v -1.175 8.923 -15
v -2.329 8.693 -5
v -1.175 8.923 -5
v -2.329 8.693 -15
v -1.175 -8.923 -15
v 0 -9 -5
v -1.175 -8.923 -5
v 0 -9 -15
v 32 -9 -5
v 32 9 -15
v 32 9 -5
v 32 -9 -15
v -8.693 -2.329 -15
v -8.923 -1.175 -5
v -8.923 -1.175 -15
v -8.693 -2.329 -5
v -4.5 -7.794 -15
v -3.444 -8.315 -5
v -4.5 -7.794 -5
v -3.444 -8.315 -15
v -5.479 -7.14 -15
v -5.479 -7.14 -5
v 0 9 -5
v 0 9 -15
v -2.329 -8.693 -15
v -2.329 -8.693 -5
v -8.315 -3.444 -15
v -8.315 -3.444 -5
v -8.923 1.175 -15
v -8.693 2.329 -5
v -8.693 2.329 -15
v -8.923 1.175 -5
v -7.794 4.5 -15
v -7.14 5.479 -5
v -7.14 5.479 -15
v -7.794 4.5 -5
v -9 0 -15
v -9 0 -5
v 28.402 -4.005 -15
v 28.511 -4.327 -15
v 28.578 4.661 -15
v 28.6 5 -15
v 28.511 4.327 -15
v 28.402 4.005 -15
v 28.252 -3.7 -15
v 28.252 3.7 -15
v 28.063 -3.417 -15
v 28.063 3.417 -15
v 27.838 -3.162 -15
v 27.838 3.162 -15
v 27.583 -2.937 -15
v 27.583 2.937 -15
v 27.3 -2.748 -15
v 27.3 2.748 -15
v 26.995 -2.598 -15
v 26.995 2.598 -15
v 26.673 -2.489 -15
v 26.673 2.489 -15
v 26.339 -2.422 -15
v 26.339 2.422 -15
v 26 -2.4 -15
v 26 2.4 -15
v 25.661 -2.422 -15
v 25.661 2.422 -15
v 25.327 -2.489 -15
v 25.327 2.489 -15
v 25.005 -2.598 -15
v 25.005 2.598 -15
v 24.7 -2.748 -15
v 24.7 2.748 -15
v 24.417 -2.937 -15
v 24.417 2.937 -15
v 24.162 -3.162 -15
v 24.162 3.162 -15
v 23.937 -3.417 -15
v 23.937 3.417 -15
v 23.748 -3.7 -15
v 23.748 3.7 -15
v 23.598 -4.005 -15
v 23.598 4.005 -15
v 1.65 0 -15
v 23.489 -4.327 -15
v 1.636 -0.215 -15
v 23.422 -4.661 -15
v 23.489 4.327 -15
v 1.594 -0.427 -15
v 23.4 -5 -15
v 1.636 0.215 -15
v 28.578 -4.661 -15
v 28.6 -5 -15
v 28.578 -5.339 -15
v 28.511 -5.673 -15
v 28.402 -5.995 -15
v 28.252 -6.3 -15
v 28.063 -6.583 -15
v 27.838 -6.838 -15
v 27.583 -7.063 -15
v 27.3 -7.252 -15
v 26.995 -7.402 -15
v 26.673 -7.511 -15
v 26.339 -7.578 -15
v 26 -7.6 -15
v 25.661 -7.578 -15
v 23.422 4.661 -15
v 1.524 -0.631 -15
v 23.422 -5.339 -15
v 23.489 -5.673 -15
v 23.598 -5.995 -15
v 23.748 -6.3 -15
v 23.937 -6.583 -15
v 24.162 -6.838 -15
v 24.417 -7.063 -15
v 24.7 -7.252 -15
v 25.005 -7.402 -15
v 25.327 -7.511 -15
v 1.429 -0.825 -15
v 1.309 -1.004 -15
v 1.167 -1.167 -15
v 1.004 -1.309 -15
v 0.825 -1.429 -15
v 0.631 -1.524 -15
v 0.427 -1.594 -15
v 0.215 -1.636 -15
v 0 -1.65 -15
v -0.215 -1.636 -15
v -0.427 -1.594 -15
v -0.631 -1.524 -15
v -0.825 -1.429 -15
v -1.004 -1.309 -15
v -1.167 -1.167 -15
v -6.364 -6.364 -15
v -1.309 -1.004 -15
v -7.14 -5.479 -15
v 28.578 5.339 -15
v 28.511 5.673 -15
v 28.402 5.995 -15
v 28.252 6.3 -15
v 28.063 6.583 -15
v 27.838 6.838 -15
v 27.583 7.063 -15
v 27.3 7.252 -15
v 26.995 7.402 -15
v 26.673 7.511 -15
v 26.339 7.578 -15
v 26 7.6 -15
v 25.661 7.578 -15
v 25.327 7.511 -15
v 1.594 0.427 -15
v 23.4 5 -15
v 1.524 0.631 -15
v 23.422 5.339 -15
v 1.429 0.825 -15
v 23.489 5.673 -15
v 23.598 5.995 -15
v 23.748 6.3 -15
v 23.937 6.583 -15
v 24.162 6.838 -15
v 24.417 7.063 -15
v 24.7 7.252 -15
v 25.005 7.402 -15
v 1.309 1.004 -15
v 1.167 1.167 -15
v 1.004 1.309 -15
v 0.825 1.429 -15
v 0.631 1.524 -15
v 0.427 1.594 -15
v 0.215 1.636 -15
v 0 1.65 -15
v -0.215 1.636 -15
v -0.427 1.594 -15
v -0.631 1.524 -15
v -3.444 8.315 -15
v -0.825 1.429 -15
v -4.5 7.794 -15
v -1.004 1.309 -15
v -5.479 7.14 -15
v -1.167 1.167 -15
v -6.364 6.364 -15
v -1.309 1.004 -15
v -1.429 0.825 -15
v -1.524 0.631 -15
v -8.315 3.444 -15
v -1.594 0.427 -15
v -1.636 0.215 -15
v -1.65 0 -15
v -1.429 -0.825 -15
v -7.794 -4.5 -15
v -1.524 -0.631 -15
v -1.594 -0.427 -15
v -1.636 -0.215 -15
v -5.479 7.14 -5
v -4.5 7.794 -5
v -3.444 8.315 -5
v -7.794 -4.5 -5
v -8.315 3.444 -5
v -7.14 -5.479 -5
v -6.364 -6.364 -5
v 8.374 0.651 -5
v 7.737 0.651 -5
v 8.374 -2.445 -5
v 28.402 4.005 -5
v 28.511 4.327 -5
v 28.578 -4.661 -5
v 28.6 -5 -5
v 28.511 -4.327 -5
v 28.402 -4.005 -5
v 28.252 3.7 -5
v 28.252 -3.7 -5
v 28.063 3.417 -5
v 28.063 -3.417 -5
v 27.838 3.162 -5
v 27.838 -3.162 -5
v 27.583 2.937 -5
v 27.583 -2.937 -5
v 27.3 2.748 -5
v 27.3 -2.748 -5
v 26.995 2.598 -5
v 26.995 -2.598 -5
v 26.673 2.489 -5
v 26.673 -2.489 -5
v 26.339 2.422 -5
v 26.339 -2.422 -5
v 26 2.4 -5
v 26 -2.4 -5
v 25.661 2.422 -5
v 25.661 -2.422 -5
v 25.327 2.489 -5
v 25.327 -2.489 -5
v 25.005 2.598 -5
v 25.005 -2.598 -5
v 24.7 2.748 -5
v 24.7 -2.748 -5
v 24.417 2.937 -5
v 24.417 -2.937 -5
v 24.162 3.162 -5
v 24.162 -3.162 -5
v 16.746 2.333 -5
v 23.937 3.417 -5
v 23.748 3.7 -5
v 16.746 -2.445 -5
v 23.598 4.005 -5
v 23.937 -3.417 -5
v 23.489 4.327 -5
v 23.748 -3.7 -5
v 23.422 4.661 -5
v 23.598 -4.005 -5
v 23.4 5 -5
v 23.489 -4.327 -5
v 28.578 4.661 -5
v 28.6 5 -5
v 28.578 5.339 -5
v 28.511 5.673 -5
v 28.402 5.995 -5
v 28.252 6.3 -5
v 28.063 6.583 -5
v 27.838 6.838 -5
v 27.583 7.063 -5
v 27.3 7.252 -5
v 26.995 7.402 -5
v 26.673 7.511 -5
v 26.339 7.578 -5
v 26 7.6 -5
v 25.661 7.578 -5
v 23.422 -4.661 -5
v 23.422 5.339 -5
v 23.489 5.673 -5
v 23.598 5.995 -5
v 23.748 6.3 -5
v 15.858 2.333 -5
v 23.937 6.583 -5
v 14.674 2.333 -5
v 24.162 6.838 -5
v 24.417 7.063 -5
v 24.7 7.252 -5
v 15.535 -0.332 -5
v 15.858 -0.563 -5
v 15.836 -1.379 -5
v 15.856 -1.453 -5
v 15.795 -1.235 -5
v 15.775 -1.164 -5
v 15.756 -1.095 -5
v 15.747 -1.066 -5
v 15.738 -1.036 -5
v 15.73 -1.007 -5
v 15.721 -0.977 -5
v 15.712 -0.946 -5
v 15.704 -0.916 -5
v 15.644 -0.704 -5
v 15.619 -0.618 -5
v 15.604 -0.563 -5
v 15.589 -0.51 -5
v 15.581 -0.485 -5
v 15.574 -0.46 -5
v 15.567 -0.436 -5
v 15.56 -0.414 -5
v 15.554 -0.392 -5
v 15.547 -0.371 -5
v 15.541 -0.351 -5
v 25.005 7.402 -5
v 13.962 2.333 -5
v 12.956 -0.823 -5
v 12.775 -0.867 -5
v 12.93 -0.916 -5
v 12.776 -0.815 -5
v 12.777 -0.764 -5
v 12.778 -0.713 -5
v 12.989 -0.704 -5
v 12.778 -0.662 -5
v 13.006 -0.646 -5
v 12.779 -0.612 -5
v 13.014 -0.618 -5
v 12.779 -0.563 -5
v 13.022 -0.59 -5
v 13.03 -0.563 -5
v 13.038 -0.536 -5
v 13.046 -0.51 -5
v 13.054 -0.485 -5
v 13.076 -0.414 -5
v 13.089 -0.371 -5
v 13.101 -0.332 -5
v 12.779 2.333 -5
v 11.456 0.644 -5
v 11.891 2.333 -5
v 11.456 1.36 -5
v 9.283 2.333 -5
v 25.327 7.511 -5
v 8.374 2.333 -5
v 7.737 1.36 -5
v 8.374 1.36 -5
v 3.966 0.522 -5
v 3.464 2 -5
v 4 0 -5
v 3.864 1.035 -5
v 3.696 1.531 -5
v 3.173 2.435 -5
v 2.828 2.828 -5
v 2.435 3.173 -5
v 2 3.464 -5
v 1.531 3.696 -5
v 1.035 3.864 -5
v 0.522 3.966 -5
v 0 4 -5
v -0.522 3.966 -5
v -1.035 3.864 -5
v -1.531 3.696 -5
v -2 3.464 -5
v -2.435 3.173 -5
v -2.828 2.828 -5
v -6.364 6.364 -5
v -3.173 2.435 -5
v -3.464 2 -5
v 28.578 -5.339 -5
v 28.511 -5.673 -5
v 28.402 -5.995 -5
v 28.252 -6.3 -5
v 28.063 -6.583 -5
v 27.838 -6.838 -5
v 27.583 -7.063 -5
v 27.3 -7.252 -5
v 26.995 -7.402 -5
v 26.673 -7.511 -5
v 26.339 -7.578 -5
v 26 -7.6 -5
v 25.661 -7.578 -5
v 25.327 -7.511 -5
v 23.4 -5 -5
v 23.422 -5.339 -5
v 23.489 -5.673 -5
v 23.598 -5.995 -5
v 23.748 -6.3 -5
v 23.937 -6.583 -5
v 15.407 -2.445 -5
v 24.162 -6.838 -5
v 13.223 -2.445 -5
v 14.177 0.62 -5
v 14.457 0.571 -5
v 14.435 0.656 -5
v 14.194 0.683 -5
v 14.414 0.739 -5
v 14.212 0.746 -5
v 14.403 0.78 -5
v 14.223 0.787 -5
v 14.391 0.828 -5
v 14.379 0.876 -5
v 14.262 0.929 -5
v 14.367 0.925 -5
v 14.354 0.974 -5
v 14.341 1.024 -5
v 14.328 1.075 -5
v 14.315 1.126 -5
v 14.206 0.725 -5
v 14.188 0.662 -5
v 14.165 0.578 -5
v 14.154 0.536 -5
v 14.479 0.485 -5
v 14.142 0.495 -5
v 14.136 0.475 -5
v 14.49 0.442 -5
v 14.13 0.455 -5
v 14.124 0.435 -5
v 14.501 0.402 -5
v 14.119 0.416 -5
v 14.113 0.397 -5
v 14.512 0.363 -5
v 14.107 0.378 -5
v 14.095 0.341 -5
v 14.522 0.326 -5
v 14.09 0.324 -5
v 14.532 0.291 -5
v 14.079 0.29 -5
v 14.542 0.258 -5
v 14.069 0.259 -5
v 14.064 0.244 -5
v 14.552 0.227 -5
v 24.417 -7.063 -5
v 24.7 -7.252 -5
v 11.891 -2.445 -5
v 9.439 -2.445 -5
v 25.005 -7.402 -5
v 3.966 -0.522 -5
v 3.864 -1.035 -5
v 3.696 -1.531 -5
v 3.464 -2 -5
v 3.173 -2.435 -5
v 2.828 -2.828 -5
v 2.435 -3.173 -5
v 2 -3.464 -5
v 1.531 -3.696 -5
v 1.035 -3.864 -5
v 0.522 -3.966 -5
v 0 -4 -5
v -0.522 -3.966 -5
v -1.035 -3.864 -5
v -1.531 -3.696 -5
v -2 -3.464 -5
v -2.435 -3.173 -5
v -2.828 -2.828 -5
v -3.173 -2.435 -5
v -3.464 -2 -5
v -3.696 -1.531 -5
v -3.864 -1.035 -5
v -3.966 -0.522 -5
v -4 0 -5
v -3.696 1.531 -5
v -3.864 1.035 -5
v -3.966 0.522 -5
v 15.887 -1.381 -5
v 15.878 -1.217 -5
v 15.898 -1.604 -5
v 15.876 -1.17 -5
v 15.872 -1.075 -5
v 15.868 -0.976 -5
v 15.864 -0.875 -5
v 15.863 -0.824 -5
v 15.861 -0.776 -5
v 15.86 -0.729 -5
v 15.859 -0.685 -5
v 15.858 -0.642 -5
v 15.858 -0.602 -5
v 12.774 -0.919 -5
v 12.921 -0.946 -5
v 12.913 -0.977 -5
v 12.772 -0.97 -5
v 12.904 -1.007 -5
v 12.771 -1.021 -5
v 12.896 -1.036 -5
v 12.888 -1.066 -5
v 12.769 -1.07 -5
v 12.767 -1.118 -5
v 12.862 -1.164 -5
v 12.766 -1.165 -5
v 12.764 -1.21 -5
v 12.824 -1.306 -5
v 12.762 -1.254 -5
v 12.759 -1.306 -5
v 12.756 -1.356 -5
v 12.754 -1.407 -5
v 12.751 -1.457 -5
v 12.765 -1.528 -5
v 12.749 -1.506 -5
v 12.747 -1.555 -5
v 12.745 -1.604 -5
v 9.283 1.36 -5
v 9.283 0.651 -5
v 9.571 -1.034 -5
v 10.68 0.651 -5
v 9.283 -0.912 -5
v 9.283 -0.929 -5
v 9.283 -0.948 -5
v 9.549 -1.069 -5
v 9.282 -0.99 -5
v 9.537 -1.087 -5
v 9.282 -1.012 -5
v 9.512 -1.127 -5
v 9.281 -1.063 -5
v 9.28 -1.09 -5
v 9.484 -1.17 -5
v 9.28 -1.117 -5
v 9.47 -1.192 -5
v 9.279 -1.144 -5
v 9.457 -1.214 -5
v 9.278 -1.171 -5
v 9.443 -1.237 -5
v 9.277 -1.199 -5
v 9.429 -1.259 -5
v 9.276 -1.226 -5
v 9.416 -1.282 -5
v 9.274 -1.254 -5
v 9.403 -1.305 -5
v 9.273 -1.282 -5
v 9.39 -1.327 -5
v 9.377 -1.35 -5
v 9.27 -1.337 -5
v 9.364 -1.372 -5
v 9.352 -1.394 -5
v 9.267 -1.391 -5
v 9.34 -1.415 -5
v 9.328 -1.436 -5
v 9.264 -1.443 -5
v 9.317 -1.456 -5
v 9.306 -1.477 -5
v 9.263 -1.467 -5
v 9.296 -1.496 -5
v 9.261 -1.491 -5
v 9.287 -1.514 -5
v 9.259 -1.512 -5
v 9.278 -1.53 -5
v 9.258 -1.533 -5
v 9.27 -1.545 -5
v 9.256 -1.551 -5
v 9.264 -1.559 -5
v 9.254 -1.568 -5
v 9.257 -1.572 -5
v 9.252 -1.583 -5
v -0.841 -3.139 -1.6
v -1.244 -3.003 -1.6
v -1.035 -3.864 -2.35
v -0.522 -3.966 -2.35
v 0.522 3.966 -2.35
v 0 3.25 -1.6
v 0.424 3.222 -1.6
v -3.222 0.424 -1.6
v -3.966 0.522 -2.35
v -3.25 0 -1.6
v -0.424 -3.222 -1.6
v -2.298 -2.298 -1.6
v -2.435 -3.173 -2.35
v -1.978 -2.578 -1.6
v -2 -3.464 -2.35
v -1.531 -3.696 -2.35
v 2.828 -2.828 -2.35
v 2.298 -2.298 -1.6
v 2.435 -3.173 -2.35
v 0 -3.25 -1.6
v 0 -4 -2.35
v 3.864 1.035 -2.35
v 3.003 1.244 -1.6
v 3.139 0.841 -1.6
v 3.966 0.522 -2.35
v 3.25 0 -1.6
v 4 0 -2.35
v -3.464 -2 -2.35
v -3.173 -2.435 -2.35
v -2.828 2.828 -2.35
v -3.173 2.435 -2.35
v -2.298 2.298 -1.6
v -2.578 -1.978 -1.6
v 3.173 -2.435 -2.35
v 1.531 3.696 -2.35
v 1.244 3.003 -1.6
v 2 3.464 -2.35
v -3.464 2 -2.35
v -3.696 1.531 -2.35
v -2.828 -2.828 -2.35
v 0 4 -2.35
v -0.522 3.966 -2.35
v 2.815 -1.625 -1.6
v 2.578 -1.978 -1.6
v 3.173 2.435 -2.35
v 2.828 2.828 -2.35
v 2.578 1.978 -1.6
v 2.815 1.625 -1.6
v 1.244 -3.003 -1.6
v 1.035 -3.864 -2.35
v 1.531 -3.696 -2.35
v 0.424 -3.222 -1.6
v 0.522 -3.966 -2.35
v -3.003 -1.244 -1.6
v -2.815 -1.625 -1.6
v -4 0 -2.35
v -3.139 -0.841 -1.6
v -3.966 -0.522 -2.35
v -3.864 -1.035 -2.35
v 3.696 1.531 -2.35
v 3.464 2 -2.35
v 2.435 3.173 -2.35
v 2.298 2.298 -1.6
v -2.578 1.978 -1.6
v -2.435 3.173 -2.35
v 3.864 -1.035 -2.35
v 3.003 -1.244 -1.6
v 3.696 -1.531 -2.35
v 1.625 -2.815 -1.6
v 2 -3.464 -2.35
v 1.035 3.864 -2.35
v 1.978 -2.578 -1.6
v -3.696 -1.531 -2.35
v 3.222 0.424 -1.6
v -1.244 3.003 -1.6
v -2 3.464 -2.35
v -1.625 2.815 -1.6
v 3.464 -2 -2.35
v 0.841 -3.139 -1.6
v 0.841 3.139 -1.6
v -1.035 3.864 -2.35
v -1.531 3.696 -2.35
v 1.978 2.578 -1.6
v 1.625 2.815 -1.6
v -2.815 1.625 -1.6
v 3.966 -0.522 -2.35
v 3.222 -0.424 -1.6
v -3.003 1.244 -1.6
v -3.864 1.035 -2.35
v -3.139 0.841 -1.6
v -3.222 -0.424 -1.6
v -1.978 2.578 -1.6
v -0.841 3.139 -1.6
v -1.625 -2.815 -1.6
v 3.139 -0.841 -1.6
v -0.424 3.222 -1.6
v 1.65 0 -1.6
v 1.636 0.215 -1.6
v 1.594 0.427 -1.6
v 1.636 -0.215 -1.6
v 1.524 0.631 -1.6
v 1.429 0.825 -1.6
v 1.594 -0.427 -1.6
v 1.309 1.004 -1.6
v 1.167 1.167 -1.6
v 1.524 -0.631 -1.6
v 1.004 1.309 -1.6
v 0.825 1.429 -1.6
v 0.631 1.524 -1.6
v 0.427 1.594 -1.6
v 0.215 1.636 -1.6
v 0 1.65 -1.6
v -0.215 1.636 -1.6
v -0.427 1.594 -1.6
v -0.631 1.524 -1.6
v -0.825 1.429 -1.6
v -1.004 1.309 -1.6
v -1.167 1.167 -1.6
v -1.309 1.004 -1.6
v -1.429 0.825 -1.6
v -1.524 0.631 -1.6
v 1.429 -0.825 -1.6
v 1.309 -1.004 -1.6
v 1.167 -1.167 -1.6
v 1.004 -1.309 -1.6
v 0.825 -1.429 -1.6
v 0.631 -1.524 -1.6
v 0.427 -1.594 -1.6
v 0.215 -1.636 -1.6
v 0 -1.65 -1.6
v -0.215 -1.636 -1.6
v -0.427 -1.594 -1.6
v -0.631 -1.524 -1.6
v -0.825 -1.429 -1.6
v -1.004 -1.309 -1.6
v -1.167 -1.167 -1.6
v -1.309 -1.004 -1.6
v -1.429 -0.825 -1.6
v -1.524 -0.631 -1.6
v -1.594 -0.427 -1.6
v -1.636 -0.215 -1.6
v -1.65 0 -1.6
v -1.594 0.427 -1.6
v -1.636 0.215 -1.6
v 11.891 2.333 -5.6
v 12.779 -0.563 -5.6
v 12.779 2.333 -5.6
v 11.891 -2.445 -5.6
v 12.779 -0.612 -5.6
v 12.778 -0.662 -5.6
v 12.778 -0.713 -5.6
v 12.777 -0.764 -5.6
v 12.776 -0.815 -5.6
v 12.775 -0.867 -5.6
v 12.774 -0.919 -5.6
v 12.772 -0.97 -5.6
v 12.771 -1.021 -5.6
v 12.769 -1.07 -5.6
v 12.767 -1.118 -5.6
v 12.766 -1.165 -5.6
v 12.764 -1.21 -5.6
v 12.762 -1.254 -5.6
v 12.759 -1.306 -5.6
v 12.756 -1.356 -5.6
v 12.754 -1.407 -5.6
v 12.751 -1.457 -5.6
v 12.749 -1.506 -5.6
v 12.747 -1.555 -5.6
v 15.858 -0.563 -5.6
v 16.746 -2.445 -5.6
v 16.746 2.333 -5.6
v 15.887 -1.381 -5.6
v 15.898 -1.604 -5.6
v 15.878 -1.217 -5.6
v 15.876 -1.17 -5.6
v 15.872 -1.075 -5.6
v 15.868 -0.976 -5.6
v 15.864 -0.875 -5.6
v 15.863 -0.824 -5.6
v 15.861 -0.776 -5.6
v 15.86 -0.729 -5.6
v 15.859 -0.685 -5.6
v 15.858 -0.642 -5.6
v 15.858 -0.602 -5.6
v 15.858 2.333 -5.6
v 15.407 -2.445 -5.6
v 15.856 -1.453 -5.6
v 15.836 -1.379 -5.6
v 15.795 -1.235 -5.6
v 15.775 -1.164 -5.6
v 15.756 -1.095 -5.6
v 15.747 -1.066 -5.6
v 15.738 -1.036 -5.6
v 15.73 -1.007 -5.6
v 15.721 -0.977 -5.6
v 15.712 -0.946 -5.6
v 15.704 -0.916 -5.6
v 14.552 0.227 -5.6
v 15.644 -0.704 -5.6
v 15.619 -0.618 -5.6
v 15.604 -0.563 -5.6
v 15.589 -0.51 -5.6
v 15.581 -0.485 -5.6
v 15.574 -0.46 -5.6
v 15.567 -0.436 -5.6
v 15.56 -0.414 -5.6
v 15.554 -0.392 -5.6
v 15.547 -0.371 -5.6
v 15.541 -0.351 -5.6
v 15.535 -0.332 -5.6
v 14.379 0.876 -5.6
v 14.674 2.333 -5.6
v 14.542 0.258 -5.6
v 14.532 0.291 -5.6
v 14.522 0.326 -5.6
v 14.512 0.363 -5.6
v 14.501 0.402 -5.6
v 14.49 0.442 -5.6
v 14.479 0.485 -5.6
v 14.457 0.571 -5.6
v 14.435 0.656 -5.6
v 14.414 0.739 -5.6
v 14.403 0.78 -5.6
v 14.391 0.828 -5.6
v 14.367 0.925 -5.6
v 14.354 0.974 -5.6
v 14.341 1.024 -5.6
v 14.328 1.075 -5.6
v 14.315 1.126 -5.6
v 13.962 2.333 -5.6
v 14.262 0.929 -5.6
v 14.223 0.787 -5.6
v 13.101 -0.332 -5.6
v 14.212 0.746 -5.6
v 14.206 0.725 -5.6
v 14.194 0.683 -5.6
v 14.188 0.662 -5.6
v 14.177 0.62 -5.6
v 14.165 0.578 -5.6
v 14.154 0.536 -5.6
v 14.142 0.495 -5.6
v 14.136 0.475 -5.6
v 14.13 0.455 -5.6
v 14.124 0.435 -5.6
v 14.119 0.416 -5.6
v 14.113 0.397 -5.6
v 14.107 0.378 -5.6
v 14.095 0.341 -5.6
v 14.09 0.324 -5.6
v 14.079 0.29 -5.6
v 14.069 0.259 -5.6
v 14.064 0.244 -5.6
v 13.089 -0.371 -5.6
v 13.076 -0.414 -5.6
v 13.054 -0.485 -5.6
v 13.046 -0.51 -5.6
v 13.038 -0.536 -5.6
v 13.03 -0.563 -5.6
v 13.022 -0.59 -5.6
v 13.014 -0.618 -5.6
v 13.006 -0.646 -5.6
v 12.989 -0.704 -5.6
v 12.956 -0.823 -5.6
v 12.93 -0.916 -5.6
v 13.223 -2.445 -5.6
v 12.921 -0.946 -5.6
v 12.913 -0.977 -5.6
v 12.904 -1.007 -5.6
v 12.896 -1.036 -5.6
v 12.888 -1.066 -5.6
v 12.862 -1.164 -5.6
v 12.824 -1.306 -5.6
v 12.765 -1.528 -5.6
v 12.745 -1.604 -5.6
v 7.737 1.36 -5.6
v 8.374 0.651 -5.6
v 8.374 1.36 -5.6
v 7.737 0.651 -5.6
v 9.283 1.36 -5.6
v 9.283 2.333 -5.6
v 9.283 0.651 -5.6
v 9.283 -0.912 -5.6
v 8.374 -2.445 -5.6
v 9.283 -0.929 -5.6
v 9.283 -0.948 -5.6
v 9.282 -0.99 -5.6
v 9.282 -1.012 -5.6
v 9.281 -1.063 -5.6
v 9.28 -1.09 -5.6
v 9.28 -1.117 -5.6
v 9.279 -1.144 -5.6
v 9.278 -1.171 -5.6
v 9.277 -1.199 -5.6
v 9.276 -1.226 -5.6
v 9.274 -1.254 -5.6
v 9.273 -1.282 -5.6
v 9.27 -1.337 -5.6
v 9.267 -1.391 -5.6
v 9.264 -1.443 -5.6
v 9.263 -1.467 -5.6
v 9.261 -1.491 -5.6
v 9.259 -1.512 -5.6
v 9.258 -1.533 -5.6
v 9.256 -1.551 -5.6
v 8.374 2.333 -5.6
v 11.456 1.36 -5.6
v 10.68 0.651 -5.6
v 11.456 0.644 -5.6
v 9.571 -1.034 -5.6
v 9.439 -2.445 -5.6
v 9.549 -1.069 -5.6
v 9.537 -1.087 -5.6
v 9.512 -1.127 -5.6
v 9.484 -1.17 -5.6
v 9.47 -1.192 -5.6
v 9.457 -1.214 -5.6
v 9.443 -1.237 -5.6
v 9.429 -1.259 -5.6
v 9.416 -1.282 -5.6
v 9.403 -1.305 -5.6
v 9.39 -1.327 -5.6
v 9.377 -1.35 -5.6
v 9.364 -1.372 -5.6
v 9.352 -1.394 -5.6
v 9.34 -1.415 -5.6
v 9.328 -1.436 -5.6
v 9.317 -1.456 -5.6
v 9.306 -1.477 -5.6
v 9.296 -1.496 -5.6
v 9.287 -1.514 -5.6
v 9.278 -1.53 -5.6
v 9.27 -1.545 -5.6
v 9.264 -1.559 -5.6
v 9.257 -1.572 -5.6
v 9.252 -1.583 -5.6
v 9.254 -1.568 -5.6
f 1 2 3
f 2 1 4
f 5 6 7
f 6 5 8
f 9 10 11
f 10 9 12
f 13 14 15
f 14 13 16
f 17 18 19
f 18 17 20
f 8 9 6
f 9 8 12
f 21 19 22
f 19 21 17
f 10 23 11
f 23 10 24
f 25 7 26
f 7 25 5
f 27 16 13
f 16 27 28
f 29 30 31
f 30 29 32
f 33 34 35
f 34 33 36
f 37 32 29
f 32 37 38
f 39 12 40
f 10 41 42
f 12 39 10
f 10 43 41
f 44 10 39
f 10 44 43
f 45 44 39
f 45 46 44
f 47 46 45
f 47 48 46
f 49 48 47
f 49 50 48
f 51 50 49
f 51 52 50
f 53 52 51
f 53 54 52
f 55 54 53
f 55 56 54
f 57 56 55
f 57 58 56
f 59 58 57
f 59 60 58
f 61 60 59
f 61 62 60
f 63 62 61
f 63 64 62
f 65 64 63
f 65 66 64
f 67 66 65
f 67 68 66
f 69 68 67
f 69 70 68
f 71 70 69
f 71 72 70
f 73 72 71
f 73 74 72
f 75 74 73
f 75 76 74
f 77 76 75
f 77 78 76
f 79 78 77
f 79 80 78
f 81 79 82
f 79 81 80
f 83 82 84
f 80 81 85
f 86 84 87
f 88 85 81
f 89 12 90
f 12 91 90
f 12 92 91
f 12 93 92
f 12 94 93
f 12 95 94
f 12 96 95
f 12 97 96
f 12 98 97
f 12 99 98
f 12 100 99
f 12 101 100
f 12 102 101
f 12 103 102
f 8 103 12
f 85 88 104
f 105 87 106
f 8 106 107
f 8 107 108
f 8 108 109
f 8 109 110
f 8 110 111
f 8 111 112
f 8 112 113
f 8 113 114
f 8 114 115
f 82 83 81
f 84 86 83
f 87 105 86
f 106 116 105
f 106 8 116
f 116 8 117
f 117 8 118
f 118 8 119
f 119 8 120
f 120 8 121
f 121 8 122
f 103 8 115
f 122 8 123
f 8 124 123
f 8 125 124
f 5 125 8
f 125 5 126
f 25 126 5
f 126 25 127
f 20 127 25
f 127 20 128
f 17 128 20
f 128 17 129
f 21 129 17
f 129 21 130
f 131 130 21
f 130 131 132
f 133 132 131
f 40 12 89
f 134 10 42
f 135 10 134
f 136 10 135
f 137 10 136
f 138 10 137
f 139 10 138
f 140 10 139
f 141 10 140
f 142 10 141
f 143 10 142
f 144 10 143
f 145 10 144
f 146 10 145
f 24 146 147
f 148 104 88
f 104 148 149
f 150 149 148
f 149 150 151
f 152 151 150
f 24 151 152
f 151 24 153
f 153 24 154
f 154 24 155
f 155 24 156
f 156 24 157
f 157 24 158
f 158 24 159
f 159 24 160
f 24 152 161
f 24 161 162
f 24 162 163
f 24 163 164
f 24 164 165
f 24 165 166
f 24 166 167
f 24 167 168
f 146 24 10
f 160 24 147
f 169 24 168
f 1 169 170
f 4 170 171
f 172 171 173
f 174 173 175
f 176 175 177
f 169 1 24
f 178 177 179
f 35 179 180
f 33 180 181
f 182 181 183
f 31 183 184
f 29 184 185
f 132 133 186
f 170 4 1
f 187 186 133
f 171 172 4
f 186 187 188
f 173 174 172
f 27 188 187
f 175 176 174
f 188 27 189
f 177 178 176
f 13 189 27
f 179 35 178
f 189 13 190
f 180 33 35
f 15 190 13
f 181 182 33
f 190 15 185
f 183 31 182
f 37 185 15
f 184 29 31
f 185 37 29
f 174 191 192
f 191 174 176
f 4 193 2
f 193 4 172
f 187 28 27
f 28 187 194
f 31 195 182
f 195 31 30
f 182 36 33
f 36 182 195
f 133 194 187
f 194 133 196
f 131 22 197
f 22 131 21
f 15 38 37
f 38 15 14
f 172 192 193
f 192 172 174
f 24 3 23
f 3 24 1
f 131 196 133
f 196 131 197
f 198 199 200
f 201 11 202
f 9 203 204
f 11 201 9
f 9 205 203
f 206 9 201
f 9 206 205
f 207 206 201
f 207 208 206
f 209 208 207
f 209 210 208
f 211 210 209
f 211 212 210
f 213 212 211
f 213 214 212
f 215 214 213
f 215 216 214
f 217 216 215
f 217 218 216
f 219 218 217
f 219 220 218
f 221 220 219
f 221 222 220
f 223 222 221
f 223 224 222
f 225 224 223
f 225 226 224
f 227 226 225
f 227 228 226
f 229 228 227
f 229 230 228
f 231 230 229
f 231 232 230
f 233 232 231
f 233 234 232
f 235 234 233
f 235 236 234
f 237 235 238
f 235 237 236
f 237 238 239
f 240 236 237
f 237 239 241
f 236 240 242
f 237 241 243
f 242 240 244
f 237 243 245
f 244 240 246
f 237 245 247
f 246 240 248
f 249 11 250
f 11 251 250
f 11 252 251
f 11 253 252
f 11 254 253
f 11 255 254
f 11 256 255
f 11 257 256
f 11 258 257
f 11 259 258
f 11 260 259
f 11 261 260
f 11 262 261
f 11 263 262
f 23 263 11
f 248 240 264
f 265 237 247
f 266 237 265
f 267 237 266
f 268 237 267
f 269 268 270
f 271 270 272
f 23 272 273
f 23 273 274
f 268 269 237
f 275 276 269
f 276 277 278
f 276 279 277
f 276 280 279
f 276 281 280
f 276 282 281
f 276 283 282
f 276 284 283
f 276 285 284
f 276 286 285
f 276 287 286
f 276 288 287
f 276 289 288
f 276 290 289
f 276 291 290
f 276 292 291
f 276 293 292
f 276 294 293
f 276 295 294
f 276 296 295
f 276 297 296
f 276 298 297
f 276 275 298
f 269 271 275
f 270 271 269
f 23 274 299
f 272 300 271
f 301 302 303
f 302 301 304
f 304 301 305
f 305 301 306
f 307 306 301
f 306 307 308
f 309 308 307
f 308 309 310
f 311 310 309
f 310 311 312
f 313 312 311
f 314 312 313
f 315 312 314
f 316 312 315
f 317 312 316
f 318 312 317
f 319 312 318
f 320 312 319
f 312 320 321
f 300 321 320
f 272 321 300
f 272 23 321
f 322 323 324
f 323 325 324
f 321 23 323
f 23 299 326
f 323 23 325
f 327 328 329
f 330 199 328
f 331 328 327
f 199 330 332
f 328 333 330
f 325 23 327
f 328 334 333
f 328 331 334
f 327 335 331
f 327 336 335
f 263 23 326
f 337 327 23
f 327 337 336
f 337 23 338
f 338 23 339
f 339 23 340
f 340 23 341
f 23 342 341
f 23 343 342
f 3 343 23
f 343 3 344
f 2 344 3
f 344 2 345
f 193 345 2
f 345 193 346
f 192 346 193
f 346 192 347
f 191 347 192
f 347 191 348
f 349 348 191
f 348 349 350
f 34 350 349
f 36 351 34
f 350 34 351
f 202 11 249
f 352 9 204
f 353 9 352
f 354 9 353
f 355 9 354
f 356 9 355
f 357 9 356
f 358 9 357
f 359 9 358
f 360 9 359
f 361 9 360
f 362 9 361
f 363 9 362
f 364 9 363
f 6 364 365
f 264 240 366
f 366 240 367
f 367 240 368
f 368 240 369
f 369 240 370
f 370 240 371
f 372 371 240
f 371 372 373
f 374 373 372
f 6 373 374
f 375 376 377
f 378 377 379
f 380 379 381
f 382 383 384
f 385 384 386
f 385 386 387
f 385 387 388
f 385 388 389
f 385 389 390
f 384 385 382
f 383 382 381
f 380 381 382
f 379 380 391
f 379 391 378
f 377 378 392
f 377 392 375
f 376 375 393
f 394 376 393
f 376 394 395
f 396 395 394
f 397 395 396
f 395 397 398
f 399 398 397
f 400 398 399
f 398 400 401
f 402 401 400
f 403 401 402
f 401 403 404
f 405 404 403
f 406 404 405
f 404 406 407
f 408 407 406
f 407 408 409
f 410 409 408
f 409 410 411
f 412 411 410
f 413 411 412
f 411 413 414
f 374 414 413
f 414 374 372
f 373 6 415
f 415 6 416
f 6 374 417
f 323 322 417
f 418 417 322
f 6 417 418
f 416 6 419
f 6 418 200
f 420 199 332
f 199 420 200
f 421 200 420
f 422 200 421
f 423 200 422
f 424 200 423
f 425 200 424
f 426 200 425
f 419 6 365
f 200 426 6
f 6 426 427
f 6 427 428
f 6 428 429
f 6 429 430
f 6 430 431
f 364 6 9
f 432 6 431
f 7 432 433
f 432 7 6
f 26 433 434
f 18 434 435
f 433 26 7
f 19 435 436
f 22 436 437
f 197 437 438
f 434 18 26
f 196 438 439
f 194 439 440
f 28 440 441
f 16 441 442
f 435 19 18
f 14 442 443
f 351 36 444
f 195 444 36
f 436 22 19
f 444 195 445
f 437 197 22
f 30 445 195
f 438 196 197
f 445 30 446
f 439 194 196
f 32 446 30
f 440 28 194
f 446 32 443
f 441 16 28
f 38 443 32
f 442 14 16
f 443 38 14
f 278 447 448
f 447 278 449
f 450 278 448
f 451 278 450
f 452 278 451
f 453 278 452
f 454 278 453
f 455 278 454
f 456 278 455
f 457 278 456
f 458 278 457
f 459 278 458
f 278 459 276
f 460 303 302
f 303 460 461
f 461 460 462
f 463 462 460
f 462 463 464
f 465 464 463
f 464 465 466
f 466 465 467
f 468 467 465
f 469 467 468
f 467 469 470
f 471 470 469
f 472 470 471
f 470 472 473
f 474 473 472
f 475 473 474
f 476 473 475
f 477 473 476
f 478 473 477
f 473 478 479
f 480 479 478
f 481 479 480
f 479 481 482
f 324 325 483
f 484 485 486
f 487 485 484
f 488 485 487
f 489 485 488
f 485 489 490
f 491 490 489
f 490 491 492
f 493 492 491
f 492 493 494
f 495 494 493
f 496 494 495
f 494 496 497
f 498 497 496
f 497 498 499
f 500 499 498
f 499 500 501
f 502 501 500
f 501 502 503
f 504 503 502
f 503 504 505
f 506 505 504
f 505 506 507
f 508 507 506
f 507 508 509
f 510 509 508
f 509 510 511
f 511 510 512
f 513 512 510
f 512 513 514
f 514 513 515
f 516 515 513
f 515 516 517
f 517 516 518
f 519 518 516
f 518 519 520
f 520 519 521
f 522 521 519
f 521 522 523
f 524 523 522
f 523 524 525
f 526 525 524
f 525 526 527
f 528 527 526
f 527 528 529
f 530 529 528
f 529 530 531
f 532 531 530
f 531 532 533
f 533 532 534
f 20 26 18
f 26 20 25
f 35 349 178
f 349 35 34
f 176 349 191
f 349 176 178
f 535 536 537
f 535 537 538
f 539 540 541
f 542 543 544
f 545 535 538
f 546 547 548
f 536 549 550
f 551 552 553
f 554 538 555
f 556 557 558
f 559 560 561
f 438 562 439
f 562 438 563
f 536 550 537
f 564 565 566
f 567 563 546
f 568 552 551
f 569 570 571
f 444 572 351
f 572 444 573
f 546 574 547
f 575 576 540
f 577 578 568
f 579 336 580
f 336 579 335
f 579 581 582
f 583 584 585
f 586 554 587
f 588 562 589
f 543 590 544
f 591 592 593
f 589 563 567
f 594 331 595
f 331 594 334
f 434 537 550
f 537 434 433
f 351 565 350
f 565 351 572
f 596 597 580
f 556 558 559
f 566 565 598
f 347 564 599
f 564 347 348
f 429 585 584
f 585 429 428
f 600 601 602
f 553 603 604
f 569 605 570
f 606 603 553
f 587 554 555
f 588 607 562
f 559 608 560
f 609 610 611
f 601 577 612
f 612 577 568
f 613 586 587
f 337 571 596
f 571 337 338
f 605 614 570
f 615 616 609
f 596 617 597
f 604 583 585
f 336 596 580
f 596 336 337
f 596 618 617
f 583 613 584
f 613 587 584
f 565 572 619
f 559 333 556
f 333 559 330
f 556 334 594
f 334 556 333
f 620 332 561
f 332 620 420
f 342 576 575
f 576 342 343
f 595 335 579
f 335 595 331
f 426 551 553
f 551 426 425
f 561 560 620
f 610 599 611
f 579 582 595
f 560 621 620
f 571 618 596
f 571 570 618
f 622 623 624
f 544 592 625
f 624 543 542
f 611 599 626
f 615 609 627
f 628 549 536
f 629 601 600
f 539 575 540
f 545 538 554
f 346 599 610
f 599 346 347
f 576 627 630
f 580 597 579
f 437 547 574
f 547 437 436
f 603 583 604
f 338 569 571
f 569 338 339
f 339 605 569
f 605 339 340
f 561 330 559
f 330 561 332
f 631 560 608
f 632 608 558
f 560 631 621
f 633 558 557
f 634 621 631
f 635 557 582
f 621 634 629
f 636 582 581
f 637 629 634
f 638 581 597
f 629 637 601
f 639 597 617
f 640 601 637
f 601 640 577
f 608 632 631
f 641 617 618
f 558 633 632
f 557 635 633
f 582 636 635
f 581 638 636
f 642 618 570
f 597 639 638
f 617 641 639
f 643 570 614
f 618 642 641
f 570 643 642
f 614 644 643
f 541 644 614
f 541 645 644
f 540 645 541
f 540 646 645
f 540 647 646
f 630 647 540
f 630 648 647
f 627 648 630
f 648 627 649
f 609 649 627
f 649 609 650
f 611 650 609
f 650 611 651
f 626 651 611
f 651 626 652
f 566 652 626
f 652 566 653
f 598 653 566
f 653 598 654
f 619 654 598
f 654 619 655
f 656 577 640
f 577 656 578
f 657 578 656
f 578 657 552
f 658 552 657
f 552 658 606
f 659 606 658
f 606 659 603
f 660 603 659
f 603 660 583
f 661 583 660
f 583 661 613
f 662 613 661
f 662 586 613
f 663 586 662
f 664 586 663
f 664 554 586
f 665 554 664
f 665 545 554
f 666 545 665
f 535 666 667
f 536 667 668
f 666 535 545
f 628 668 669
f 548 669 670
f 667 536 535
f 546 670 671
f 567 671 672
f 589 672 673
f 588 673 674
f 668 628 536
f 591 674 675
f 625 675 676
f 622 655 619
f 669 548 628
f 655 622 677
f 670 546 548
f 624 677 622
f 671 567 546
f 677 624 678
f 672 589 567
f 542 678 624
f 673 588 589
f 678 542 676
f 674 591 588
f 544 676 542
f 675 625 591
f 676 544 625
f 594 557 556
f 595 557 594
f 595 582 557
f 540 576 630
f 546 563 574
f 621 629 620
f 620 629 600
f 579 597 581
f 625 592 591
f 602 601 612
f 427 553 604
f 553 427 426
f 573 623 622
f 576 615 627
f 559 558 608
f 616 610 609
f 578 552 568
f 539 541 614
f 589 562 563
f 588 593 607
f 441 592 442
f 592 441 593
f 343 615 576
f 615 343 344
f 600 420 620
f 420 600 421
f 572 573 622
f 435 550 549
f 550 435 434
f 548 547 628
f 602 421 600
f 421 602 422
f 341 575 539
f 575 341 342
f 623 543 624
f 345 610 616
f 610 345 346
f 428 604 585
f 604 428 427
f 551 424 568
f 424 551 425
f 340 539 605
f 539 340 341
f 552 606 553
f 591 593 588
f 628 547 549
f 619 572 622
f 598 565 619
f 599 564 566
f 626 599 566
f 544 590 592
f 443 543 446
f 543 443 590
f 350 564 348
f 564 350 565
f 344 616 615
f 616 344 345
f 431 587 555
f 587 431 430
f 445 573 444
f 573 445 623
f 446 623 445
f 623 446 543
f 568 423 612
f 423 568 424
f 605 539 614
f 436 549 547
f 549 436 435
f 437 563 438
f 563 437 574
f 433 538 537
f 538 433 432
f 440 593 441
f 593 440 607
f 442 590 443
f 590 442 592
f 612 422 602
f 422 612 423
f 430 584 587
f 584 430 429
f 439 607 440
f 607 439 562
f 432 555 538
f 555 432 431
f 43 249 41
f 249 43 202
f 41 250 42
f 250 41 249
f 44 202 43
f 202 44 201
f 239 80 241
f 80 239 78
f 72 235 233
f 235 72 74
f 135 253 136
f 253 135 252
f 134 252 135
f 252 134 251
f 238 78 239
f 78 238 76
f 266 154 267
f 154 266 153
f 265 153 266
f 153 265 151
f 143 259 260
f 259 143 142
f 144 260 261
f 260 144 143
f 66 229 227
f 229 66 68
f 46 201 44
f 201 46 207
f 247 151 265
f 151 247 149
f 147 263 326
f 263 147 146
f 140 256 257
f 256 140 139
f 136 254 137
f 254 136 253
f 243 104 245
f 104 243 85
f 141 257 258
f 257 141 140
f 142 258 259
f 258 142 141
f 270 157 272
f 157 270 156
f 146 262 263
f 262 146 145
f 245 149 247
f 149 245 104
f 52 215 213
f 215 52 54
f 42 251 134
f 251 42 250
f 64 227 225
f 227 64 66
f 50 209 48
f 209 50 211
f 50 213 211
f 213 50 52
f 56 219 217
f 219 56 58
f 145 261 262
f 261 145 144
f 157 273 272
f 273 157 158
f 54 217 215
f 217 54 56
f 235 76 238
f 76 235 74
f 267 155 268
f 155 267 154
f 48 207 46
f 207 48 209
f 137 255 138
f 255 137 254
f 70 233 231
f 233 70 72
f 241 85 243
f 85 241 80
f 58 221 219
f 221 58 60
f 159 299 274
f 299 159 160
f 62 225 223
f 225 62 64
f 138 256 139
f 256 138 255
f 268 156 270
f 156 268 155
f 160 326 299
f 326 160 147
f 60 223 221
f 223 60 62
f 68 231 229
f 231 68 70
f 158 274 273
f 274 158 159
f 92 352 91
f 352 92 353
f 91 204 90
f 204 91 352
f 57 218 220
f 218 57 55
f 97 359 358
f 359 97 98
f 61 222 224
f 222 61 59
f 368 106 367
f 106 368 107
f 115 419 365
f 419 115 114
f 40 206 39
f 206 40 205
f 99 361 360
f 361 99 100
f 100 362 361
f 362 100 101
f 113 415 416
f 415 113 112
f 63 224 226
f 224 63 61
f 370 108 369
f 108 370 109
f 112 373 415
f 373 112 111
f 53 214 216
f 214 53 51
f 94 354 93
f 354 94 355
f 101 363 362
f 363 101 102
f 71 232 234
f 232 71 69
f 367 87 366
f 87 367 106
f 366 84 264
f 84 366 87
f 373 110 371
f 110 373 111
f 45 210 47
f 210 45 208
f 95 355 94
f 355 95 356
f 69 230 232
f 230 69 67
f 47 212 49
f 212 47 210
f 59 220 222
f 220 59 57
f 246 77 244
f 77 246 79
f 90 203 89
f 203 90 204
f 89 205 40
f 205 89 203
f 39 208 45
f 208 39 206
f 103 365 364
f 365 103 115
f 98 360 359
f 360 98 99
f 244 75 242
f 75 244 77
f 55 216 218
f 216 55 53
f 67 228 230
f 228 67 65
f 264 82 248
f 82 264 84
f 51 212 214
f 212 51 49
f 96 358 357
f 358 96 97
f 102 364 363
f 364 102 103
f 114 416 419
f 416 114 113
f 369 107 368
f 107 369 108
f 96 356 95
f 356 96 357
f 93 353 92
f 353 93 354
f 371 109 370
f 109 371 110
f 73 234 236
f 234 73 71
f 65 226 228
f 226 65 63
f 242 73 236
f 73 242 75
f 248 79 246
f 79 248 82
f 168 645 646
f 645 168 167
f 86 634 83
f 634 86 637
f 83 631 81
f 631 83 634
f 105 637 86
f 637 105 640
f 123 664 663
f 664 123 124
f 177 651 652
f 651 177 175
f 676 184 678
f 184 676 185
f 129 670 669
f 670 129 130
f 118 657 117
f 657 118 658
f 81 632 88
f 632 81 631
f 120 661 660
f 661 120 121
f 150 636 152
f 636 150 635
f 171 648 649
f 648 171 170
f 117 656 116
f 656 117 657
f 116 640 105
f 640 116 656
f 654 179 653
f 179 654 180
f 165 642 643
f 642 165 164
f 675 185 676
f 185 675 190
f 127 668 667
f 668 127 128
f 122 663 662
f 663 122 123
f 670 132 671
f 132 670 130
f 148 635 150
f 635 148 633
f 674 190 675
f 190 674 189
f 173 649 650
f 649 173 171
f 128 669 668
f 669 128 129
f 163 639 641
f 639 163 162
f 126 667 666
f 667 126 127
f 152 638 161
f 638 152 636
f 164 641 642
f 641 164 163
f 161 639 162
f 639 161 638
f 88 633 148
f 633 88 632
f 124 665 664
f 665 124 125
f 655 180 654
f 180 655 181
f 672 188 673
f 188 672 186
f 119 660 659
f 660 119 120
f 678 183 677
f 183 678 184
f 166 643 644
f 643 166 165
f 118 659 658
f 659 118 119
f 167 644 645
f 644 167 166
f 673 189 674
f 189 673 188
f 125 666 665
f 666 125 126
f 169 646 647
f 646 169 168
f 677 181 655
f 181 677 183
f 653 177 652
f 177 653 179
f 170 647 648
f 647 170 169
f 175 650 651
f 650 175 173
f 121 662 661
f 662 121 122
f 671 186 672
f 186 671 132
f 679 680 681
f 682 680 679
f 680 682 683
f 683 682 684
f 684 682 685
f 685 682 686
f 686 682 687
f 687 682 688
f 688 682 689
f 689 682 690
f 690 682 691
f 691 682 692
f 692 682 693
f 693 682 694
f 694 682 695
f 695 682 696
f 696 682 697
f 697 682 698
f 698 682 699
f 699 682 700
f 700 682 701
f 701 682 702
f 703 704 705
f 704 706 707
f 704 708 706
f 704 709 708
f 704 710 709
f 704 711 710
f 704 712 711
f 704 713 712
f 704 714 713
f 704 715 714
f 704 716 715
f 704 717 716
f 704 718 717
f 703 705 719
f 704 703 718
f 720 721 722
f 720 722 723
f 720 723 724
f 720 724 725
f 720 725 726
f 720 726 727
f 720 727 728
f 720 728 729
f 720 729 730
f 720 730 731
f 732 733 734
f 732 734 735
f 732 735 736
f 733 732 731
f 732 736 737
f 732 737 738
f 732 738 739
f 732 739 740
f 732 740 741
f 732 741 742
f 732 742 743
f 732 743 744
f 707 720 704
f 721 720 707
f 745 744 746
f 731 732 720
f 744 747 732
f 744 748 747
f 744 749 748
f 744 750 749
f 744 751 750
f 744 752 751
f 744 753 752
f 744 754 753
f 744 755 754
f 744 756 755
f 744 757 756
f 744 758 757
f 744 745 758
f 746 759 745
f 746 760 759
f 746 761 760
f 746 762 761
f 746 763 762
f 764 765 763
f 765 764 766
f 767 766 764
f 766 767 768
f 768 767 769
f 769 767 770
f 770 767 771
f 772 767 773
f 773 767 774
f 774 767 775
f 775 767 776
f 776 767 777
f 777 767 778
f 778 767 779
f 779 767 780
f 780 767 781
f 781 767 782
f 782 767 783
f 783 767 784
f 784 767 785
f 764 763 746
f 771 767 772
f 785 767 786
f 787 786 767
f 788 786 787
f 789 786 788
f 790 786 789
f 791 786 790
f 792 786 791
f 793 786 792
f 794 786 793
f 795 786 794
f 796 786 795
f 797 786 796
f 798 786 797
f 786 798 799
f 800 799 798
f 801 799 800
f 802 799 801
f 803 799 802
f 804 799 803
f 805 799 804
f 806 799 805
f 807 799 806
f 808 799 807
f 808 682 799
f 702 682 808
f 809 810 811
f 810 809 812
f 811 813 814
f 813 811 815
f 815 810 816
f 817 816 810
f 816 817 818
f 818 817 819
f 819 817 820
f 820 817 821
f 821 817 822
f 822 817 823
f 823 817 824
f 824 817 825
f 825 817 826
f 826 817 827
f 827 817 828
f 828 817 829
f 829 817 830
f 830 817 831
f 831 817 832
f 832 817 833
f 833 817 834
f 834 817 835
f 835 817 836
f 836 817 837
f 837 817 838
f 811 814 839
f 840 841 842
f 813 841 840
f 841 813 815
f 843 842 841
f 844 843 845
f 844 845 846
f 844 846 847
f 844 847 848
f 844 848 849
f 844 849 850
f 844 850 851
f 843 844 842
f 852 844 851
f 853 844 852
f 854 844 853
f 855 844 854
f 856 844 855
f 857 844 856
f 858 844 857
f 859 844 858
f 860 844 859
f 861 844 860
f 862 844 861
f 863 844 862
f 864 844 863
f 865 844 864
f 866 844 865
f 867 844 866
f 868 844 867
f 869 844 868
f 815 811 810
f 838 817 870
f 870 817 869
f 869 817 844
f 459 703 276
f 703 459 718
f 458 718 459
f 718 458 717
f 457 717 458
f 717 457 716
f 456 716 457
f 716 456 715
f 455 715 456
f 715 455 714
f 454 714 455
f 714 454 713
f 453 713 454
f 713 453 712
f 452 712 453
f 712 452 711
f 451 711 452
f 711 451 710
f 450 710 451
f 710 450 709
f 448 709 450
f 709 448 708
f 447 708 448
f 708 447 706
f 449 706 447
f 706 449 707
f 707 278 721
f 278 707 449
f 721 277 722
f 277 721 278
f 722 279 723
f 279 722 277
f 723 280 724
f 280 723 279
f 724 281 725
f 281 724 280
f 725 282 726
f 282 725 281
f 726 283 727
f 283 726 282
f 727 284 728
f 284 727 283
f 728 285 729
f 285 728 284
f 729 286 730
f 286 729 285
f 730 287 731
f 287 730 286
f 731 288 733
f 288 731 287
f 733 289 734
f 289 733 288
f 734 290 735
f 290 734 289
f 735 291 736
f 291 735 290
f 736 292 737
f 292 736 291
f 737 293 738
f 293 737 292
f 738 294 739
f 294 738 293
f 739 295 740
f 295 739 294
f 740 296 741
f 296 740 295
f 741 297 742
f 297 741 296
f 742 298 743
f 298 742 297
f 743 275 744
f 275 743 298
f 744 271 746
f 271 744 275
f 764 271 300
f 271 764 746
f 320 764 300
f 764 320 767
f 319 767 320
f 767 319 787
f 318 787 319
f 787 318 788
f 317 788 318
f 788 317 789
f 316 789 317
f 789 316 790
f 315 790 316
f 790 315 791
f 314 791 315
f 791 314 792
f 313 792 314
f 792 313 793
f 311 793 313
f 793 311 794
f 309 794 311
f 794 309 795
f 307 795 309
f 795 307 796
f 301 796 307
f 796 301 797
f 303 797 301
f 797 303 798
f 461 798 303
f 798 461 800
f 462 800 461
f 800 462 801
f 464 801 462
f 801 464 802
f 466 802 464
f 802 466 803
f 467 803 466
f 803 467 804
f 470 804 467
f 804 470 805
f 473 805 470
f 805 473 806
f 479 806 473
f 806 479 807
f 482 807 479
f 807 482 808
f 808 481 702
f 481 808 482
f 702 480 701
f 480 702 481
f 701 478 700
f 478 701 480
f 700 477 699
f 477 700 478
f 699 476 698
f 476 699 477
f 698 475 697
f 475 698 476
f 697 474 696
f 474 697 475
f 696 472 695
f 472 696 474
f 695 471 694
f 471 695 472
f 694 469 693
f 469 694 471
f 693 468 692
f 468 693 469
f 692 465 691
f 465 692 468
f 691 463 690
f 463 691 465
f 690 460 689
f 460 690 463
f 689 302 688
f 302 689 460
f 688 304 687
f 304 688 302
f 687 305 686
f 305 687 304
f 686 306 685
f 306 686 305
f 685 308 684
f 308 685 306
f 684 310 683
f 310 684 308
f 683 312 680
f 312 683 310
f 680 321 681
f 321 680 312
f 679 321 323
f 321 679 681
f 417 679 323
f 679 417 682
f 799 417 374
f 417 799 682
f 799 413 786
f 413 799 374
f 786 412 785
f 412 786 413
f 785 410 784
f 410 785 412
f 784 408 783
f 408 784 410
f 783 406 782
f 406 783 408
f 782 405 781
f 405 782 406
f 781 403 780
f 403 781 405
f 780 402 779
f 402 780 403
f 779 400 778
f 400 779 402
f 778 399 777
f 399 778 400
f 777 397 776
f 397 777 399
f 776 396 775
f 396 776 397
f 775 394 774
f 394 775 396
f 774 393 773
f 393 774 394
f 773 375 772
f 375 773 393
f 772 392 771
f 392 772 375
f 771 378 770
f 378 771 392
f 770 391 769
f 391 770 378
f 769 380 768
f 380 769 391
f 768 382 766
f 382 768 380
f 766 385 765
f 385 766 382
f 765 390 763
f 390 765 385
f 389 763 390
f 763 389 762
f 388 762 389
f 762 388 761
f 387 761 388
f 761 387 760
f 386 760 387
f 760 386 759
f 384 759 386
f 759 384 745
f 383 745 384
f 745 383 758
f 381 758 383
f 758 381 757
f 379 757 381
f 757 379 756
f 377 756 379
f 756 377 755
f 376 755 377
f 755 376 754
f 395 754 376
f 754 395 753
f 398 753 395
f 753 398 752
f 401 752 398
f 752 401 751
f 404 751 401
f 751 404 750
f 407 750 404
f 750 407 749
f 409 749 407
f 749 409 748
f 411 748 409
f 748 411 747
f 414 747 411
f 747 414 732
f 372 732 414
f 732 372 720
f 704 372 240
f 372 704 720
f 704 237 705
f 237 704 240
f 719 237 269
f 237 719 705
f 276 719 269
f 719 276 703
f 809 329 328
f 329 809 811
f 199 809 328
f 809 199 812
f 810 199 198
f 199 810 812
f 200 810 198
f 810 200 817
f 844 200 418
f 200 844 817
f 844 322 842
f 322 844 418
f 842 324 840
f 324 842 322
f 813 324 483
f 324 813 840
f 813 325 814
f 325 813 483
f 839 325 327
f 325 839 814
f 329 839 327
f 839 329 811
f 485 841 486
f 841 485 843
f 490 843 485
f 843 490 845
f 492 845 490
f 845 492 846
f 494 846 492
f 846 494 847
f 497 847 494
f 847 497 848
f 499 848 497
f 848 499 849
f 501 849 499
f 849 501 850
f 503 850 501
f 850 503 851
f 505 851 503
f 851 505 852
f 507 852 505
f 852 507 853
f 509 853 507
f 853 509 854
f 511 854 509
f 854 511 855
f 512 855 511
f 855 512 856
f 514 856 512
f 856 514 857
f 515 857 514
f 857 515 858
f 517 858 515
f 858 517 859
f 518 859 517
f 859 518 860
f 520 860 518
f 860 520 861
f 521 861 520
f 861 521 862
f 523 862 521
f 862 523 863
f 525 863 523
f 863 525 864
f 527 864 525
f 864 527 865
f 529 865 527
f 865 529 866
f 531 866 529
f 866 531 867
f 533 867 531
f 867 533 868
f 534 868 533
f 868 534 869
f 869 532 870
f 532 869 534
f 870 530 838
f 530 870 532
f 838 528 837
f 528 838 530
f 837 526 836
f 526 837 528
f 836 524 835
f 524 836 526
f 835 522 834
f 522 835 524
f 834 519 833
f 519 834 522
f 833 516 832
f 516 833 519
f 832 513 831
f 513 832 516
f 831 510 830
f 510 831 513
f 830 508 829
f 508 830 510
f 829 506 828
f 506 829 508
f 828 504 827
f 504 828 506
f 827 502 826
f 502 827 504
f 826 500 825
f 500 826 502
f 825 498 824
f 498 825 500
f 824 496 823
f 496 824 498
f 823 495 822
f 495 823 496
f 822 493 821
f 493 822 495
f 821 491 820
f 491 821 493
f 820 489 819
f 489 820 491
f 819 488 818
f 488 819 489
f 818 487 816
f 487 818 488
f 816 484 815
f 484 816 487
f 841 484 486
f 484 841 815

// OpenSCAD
// Die arm for an M4 set-screw die (2.0 mm socket), for thick cardstock. Tap M4 through.
include <../cad/punch_rig_006.scad>
PART = "arm_print";
DIE_TAP = 3.3;
